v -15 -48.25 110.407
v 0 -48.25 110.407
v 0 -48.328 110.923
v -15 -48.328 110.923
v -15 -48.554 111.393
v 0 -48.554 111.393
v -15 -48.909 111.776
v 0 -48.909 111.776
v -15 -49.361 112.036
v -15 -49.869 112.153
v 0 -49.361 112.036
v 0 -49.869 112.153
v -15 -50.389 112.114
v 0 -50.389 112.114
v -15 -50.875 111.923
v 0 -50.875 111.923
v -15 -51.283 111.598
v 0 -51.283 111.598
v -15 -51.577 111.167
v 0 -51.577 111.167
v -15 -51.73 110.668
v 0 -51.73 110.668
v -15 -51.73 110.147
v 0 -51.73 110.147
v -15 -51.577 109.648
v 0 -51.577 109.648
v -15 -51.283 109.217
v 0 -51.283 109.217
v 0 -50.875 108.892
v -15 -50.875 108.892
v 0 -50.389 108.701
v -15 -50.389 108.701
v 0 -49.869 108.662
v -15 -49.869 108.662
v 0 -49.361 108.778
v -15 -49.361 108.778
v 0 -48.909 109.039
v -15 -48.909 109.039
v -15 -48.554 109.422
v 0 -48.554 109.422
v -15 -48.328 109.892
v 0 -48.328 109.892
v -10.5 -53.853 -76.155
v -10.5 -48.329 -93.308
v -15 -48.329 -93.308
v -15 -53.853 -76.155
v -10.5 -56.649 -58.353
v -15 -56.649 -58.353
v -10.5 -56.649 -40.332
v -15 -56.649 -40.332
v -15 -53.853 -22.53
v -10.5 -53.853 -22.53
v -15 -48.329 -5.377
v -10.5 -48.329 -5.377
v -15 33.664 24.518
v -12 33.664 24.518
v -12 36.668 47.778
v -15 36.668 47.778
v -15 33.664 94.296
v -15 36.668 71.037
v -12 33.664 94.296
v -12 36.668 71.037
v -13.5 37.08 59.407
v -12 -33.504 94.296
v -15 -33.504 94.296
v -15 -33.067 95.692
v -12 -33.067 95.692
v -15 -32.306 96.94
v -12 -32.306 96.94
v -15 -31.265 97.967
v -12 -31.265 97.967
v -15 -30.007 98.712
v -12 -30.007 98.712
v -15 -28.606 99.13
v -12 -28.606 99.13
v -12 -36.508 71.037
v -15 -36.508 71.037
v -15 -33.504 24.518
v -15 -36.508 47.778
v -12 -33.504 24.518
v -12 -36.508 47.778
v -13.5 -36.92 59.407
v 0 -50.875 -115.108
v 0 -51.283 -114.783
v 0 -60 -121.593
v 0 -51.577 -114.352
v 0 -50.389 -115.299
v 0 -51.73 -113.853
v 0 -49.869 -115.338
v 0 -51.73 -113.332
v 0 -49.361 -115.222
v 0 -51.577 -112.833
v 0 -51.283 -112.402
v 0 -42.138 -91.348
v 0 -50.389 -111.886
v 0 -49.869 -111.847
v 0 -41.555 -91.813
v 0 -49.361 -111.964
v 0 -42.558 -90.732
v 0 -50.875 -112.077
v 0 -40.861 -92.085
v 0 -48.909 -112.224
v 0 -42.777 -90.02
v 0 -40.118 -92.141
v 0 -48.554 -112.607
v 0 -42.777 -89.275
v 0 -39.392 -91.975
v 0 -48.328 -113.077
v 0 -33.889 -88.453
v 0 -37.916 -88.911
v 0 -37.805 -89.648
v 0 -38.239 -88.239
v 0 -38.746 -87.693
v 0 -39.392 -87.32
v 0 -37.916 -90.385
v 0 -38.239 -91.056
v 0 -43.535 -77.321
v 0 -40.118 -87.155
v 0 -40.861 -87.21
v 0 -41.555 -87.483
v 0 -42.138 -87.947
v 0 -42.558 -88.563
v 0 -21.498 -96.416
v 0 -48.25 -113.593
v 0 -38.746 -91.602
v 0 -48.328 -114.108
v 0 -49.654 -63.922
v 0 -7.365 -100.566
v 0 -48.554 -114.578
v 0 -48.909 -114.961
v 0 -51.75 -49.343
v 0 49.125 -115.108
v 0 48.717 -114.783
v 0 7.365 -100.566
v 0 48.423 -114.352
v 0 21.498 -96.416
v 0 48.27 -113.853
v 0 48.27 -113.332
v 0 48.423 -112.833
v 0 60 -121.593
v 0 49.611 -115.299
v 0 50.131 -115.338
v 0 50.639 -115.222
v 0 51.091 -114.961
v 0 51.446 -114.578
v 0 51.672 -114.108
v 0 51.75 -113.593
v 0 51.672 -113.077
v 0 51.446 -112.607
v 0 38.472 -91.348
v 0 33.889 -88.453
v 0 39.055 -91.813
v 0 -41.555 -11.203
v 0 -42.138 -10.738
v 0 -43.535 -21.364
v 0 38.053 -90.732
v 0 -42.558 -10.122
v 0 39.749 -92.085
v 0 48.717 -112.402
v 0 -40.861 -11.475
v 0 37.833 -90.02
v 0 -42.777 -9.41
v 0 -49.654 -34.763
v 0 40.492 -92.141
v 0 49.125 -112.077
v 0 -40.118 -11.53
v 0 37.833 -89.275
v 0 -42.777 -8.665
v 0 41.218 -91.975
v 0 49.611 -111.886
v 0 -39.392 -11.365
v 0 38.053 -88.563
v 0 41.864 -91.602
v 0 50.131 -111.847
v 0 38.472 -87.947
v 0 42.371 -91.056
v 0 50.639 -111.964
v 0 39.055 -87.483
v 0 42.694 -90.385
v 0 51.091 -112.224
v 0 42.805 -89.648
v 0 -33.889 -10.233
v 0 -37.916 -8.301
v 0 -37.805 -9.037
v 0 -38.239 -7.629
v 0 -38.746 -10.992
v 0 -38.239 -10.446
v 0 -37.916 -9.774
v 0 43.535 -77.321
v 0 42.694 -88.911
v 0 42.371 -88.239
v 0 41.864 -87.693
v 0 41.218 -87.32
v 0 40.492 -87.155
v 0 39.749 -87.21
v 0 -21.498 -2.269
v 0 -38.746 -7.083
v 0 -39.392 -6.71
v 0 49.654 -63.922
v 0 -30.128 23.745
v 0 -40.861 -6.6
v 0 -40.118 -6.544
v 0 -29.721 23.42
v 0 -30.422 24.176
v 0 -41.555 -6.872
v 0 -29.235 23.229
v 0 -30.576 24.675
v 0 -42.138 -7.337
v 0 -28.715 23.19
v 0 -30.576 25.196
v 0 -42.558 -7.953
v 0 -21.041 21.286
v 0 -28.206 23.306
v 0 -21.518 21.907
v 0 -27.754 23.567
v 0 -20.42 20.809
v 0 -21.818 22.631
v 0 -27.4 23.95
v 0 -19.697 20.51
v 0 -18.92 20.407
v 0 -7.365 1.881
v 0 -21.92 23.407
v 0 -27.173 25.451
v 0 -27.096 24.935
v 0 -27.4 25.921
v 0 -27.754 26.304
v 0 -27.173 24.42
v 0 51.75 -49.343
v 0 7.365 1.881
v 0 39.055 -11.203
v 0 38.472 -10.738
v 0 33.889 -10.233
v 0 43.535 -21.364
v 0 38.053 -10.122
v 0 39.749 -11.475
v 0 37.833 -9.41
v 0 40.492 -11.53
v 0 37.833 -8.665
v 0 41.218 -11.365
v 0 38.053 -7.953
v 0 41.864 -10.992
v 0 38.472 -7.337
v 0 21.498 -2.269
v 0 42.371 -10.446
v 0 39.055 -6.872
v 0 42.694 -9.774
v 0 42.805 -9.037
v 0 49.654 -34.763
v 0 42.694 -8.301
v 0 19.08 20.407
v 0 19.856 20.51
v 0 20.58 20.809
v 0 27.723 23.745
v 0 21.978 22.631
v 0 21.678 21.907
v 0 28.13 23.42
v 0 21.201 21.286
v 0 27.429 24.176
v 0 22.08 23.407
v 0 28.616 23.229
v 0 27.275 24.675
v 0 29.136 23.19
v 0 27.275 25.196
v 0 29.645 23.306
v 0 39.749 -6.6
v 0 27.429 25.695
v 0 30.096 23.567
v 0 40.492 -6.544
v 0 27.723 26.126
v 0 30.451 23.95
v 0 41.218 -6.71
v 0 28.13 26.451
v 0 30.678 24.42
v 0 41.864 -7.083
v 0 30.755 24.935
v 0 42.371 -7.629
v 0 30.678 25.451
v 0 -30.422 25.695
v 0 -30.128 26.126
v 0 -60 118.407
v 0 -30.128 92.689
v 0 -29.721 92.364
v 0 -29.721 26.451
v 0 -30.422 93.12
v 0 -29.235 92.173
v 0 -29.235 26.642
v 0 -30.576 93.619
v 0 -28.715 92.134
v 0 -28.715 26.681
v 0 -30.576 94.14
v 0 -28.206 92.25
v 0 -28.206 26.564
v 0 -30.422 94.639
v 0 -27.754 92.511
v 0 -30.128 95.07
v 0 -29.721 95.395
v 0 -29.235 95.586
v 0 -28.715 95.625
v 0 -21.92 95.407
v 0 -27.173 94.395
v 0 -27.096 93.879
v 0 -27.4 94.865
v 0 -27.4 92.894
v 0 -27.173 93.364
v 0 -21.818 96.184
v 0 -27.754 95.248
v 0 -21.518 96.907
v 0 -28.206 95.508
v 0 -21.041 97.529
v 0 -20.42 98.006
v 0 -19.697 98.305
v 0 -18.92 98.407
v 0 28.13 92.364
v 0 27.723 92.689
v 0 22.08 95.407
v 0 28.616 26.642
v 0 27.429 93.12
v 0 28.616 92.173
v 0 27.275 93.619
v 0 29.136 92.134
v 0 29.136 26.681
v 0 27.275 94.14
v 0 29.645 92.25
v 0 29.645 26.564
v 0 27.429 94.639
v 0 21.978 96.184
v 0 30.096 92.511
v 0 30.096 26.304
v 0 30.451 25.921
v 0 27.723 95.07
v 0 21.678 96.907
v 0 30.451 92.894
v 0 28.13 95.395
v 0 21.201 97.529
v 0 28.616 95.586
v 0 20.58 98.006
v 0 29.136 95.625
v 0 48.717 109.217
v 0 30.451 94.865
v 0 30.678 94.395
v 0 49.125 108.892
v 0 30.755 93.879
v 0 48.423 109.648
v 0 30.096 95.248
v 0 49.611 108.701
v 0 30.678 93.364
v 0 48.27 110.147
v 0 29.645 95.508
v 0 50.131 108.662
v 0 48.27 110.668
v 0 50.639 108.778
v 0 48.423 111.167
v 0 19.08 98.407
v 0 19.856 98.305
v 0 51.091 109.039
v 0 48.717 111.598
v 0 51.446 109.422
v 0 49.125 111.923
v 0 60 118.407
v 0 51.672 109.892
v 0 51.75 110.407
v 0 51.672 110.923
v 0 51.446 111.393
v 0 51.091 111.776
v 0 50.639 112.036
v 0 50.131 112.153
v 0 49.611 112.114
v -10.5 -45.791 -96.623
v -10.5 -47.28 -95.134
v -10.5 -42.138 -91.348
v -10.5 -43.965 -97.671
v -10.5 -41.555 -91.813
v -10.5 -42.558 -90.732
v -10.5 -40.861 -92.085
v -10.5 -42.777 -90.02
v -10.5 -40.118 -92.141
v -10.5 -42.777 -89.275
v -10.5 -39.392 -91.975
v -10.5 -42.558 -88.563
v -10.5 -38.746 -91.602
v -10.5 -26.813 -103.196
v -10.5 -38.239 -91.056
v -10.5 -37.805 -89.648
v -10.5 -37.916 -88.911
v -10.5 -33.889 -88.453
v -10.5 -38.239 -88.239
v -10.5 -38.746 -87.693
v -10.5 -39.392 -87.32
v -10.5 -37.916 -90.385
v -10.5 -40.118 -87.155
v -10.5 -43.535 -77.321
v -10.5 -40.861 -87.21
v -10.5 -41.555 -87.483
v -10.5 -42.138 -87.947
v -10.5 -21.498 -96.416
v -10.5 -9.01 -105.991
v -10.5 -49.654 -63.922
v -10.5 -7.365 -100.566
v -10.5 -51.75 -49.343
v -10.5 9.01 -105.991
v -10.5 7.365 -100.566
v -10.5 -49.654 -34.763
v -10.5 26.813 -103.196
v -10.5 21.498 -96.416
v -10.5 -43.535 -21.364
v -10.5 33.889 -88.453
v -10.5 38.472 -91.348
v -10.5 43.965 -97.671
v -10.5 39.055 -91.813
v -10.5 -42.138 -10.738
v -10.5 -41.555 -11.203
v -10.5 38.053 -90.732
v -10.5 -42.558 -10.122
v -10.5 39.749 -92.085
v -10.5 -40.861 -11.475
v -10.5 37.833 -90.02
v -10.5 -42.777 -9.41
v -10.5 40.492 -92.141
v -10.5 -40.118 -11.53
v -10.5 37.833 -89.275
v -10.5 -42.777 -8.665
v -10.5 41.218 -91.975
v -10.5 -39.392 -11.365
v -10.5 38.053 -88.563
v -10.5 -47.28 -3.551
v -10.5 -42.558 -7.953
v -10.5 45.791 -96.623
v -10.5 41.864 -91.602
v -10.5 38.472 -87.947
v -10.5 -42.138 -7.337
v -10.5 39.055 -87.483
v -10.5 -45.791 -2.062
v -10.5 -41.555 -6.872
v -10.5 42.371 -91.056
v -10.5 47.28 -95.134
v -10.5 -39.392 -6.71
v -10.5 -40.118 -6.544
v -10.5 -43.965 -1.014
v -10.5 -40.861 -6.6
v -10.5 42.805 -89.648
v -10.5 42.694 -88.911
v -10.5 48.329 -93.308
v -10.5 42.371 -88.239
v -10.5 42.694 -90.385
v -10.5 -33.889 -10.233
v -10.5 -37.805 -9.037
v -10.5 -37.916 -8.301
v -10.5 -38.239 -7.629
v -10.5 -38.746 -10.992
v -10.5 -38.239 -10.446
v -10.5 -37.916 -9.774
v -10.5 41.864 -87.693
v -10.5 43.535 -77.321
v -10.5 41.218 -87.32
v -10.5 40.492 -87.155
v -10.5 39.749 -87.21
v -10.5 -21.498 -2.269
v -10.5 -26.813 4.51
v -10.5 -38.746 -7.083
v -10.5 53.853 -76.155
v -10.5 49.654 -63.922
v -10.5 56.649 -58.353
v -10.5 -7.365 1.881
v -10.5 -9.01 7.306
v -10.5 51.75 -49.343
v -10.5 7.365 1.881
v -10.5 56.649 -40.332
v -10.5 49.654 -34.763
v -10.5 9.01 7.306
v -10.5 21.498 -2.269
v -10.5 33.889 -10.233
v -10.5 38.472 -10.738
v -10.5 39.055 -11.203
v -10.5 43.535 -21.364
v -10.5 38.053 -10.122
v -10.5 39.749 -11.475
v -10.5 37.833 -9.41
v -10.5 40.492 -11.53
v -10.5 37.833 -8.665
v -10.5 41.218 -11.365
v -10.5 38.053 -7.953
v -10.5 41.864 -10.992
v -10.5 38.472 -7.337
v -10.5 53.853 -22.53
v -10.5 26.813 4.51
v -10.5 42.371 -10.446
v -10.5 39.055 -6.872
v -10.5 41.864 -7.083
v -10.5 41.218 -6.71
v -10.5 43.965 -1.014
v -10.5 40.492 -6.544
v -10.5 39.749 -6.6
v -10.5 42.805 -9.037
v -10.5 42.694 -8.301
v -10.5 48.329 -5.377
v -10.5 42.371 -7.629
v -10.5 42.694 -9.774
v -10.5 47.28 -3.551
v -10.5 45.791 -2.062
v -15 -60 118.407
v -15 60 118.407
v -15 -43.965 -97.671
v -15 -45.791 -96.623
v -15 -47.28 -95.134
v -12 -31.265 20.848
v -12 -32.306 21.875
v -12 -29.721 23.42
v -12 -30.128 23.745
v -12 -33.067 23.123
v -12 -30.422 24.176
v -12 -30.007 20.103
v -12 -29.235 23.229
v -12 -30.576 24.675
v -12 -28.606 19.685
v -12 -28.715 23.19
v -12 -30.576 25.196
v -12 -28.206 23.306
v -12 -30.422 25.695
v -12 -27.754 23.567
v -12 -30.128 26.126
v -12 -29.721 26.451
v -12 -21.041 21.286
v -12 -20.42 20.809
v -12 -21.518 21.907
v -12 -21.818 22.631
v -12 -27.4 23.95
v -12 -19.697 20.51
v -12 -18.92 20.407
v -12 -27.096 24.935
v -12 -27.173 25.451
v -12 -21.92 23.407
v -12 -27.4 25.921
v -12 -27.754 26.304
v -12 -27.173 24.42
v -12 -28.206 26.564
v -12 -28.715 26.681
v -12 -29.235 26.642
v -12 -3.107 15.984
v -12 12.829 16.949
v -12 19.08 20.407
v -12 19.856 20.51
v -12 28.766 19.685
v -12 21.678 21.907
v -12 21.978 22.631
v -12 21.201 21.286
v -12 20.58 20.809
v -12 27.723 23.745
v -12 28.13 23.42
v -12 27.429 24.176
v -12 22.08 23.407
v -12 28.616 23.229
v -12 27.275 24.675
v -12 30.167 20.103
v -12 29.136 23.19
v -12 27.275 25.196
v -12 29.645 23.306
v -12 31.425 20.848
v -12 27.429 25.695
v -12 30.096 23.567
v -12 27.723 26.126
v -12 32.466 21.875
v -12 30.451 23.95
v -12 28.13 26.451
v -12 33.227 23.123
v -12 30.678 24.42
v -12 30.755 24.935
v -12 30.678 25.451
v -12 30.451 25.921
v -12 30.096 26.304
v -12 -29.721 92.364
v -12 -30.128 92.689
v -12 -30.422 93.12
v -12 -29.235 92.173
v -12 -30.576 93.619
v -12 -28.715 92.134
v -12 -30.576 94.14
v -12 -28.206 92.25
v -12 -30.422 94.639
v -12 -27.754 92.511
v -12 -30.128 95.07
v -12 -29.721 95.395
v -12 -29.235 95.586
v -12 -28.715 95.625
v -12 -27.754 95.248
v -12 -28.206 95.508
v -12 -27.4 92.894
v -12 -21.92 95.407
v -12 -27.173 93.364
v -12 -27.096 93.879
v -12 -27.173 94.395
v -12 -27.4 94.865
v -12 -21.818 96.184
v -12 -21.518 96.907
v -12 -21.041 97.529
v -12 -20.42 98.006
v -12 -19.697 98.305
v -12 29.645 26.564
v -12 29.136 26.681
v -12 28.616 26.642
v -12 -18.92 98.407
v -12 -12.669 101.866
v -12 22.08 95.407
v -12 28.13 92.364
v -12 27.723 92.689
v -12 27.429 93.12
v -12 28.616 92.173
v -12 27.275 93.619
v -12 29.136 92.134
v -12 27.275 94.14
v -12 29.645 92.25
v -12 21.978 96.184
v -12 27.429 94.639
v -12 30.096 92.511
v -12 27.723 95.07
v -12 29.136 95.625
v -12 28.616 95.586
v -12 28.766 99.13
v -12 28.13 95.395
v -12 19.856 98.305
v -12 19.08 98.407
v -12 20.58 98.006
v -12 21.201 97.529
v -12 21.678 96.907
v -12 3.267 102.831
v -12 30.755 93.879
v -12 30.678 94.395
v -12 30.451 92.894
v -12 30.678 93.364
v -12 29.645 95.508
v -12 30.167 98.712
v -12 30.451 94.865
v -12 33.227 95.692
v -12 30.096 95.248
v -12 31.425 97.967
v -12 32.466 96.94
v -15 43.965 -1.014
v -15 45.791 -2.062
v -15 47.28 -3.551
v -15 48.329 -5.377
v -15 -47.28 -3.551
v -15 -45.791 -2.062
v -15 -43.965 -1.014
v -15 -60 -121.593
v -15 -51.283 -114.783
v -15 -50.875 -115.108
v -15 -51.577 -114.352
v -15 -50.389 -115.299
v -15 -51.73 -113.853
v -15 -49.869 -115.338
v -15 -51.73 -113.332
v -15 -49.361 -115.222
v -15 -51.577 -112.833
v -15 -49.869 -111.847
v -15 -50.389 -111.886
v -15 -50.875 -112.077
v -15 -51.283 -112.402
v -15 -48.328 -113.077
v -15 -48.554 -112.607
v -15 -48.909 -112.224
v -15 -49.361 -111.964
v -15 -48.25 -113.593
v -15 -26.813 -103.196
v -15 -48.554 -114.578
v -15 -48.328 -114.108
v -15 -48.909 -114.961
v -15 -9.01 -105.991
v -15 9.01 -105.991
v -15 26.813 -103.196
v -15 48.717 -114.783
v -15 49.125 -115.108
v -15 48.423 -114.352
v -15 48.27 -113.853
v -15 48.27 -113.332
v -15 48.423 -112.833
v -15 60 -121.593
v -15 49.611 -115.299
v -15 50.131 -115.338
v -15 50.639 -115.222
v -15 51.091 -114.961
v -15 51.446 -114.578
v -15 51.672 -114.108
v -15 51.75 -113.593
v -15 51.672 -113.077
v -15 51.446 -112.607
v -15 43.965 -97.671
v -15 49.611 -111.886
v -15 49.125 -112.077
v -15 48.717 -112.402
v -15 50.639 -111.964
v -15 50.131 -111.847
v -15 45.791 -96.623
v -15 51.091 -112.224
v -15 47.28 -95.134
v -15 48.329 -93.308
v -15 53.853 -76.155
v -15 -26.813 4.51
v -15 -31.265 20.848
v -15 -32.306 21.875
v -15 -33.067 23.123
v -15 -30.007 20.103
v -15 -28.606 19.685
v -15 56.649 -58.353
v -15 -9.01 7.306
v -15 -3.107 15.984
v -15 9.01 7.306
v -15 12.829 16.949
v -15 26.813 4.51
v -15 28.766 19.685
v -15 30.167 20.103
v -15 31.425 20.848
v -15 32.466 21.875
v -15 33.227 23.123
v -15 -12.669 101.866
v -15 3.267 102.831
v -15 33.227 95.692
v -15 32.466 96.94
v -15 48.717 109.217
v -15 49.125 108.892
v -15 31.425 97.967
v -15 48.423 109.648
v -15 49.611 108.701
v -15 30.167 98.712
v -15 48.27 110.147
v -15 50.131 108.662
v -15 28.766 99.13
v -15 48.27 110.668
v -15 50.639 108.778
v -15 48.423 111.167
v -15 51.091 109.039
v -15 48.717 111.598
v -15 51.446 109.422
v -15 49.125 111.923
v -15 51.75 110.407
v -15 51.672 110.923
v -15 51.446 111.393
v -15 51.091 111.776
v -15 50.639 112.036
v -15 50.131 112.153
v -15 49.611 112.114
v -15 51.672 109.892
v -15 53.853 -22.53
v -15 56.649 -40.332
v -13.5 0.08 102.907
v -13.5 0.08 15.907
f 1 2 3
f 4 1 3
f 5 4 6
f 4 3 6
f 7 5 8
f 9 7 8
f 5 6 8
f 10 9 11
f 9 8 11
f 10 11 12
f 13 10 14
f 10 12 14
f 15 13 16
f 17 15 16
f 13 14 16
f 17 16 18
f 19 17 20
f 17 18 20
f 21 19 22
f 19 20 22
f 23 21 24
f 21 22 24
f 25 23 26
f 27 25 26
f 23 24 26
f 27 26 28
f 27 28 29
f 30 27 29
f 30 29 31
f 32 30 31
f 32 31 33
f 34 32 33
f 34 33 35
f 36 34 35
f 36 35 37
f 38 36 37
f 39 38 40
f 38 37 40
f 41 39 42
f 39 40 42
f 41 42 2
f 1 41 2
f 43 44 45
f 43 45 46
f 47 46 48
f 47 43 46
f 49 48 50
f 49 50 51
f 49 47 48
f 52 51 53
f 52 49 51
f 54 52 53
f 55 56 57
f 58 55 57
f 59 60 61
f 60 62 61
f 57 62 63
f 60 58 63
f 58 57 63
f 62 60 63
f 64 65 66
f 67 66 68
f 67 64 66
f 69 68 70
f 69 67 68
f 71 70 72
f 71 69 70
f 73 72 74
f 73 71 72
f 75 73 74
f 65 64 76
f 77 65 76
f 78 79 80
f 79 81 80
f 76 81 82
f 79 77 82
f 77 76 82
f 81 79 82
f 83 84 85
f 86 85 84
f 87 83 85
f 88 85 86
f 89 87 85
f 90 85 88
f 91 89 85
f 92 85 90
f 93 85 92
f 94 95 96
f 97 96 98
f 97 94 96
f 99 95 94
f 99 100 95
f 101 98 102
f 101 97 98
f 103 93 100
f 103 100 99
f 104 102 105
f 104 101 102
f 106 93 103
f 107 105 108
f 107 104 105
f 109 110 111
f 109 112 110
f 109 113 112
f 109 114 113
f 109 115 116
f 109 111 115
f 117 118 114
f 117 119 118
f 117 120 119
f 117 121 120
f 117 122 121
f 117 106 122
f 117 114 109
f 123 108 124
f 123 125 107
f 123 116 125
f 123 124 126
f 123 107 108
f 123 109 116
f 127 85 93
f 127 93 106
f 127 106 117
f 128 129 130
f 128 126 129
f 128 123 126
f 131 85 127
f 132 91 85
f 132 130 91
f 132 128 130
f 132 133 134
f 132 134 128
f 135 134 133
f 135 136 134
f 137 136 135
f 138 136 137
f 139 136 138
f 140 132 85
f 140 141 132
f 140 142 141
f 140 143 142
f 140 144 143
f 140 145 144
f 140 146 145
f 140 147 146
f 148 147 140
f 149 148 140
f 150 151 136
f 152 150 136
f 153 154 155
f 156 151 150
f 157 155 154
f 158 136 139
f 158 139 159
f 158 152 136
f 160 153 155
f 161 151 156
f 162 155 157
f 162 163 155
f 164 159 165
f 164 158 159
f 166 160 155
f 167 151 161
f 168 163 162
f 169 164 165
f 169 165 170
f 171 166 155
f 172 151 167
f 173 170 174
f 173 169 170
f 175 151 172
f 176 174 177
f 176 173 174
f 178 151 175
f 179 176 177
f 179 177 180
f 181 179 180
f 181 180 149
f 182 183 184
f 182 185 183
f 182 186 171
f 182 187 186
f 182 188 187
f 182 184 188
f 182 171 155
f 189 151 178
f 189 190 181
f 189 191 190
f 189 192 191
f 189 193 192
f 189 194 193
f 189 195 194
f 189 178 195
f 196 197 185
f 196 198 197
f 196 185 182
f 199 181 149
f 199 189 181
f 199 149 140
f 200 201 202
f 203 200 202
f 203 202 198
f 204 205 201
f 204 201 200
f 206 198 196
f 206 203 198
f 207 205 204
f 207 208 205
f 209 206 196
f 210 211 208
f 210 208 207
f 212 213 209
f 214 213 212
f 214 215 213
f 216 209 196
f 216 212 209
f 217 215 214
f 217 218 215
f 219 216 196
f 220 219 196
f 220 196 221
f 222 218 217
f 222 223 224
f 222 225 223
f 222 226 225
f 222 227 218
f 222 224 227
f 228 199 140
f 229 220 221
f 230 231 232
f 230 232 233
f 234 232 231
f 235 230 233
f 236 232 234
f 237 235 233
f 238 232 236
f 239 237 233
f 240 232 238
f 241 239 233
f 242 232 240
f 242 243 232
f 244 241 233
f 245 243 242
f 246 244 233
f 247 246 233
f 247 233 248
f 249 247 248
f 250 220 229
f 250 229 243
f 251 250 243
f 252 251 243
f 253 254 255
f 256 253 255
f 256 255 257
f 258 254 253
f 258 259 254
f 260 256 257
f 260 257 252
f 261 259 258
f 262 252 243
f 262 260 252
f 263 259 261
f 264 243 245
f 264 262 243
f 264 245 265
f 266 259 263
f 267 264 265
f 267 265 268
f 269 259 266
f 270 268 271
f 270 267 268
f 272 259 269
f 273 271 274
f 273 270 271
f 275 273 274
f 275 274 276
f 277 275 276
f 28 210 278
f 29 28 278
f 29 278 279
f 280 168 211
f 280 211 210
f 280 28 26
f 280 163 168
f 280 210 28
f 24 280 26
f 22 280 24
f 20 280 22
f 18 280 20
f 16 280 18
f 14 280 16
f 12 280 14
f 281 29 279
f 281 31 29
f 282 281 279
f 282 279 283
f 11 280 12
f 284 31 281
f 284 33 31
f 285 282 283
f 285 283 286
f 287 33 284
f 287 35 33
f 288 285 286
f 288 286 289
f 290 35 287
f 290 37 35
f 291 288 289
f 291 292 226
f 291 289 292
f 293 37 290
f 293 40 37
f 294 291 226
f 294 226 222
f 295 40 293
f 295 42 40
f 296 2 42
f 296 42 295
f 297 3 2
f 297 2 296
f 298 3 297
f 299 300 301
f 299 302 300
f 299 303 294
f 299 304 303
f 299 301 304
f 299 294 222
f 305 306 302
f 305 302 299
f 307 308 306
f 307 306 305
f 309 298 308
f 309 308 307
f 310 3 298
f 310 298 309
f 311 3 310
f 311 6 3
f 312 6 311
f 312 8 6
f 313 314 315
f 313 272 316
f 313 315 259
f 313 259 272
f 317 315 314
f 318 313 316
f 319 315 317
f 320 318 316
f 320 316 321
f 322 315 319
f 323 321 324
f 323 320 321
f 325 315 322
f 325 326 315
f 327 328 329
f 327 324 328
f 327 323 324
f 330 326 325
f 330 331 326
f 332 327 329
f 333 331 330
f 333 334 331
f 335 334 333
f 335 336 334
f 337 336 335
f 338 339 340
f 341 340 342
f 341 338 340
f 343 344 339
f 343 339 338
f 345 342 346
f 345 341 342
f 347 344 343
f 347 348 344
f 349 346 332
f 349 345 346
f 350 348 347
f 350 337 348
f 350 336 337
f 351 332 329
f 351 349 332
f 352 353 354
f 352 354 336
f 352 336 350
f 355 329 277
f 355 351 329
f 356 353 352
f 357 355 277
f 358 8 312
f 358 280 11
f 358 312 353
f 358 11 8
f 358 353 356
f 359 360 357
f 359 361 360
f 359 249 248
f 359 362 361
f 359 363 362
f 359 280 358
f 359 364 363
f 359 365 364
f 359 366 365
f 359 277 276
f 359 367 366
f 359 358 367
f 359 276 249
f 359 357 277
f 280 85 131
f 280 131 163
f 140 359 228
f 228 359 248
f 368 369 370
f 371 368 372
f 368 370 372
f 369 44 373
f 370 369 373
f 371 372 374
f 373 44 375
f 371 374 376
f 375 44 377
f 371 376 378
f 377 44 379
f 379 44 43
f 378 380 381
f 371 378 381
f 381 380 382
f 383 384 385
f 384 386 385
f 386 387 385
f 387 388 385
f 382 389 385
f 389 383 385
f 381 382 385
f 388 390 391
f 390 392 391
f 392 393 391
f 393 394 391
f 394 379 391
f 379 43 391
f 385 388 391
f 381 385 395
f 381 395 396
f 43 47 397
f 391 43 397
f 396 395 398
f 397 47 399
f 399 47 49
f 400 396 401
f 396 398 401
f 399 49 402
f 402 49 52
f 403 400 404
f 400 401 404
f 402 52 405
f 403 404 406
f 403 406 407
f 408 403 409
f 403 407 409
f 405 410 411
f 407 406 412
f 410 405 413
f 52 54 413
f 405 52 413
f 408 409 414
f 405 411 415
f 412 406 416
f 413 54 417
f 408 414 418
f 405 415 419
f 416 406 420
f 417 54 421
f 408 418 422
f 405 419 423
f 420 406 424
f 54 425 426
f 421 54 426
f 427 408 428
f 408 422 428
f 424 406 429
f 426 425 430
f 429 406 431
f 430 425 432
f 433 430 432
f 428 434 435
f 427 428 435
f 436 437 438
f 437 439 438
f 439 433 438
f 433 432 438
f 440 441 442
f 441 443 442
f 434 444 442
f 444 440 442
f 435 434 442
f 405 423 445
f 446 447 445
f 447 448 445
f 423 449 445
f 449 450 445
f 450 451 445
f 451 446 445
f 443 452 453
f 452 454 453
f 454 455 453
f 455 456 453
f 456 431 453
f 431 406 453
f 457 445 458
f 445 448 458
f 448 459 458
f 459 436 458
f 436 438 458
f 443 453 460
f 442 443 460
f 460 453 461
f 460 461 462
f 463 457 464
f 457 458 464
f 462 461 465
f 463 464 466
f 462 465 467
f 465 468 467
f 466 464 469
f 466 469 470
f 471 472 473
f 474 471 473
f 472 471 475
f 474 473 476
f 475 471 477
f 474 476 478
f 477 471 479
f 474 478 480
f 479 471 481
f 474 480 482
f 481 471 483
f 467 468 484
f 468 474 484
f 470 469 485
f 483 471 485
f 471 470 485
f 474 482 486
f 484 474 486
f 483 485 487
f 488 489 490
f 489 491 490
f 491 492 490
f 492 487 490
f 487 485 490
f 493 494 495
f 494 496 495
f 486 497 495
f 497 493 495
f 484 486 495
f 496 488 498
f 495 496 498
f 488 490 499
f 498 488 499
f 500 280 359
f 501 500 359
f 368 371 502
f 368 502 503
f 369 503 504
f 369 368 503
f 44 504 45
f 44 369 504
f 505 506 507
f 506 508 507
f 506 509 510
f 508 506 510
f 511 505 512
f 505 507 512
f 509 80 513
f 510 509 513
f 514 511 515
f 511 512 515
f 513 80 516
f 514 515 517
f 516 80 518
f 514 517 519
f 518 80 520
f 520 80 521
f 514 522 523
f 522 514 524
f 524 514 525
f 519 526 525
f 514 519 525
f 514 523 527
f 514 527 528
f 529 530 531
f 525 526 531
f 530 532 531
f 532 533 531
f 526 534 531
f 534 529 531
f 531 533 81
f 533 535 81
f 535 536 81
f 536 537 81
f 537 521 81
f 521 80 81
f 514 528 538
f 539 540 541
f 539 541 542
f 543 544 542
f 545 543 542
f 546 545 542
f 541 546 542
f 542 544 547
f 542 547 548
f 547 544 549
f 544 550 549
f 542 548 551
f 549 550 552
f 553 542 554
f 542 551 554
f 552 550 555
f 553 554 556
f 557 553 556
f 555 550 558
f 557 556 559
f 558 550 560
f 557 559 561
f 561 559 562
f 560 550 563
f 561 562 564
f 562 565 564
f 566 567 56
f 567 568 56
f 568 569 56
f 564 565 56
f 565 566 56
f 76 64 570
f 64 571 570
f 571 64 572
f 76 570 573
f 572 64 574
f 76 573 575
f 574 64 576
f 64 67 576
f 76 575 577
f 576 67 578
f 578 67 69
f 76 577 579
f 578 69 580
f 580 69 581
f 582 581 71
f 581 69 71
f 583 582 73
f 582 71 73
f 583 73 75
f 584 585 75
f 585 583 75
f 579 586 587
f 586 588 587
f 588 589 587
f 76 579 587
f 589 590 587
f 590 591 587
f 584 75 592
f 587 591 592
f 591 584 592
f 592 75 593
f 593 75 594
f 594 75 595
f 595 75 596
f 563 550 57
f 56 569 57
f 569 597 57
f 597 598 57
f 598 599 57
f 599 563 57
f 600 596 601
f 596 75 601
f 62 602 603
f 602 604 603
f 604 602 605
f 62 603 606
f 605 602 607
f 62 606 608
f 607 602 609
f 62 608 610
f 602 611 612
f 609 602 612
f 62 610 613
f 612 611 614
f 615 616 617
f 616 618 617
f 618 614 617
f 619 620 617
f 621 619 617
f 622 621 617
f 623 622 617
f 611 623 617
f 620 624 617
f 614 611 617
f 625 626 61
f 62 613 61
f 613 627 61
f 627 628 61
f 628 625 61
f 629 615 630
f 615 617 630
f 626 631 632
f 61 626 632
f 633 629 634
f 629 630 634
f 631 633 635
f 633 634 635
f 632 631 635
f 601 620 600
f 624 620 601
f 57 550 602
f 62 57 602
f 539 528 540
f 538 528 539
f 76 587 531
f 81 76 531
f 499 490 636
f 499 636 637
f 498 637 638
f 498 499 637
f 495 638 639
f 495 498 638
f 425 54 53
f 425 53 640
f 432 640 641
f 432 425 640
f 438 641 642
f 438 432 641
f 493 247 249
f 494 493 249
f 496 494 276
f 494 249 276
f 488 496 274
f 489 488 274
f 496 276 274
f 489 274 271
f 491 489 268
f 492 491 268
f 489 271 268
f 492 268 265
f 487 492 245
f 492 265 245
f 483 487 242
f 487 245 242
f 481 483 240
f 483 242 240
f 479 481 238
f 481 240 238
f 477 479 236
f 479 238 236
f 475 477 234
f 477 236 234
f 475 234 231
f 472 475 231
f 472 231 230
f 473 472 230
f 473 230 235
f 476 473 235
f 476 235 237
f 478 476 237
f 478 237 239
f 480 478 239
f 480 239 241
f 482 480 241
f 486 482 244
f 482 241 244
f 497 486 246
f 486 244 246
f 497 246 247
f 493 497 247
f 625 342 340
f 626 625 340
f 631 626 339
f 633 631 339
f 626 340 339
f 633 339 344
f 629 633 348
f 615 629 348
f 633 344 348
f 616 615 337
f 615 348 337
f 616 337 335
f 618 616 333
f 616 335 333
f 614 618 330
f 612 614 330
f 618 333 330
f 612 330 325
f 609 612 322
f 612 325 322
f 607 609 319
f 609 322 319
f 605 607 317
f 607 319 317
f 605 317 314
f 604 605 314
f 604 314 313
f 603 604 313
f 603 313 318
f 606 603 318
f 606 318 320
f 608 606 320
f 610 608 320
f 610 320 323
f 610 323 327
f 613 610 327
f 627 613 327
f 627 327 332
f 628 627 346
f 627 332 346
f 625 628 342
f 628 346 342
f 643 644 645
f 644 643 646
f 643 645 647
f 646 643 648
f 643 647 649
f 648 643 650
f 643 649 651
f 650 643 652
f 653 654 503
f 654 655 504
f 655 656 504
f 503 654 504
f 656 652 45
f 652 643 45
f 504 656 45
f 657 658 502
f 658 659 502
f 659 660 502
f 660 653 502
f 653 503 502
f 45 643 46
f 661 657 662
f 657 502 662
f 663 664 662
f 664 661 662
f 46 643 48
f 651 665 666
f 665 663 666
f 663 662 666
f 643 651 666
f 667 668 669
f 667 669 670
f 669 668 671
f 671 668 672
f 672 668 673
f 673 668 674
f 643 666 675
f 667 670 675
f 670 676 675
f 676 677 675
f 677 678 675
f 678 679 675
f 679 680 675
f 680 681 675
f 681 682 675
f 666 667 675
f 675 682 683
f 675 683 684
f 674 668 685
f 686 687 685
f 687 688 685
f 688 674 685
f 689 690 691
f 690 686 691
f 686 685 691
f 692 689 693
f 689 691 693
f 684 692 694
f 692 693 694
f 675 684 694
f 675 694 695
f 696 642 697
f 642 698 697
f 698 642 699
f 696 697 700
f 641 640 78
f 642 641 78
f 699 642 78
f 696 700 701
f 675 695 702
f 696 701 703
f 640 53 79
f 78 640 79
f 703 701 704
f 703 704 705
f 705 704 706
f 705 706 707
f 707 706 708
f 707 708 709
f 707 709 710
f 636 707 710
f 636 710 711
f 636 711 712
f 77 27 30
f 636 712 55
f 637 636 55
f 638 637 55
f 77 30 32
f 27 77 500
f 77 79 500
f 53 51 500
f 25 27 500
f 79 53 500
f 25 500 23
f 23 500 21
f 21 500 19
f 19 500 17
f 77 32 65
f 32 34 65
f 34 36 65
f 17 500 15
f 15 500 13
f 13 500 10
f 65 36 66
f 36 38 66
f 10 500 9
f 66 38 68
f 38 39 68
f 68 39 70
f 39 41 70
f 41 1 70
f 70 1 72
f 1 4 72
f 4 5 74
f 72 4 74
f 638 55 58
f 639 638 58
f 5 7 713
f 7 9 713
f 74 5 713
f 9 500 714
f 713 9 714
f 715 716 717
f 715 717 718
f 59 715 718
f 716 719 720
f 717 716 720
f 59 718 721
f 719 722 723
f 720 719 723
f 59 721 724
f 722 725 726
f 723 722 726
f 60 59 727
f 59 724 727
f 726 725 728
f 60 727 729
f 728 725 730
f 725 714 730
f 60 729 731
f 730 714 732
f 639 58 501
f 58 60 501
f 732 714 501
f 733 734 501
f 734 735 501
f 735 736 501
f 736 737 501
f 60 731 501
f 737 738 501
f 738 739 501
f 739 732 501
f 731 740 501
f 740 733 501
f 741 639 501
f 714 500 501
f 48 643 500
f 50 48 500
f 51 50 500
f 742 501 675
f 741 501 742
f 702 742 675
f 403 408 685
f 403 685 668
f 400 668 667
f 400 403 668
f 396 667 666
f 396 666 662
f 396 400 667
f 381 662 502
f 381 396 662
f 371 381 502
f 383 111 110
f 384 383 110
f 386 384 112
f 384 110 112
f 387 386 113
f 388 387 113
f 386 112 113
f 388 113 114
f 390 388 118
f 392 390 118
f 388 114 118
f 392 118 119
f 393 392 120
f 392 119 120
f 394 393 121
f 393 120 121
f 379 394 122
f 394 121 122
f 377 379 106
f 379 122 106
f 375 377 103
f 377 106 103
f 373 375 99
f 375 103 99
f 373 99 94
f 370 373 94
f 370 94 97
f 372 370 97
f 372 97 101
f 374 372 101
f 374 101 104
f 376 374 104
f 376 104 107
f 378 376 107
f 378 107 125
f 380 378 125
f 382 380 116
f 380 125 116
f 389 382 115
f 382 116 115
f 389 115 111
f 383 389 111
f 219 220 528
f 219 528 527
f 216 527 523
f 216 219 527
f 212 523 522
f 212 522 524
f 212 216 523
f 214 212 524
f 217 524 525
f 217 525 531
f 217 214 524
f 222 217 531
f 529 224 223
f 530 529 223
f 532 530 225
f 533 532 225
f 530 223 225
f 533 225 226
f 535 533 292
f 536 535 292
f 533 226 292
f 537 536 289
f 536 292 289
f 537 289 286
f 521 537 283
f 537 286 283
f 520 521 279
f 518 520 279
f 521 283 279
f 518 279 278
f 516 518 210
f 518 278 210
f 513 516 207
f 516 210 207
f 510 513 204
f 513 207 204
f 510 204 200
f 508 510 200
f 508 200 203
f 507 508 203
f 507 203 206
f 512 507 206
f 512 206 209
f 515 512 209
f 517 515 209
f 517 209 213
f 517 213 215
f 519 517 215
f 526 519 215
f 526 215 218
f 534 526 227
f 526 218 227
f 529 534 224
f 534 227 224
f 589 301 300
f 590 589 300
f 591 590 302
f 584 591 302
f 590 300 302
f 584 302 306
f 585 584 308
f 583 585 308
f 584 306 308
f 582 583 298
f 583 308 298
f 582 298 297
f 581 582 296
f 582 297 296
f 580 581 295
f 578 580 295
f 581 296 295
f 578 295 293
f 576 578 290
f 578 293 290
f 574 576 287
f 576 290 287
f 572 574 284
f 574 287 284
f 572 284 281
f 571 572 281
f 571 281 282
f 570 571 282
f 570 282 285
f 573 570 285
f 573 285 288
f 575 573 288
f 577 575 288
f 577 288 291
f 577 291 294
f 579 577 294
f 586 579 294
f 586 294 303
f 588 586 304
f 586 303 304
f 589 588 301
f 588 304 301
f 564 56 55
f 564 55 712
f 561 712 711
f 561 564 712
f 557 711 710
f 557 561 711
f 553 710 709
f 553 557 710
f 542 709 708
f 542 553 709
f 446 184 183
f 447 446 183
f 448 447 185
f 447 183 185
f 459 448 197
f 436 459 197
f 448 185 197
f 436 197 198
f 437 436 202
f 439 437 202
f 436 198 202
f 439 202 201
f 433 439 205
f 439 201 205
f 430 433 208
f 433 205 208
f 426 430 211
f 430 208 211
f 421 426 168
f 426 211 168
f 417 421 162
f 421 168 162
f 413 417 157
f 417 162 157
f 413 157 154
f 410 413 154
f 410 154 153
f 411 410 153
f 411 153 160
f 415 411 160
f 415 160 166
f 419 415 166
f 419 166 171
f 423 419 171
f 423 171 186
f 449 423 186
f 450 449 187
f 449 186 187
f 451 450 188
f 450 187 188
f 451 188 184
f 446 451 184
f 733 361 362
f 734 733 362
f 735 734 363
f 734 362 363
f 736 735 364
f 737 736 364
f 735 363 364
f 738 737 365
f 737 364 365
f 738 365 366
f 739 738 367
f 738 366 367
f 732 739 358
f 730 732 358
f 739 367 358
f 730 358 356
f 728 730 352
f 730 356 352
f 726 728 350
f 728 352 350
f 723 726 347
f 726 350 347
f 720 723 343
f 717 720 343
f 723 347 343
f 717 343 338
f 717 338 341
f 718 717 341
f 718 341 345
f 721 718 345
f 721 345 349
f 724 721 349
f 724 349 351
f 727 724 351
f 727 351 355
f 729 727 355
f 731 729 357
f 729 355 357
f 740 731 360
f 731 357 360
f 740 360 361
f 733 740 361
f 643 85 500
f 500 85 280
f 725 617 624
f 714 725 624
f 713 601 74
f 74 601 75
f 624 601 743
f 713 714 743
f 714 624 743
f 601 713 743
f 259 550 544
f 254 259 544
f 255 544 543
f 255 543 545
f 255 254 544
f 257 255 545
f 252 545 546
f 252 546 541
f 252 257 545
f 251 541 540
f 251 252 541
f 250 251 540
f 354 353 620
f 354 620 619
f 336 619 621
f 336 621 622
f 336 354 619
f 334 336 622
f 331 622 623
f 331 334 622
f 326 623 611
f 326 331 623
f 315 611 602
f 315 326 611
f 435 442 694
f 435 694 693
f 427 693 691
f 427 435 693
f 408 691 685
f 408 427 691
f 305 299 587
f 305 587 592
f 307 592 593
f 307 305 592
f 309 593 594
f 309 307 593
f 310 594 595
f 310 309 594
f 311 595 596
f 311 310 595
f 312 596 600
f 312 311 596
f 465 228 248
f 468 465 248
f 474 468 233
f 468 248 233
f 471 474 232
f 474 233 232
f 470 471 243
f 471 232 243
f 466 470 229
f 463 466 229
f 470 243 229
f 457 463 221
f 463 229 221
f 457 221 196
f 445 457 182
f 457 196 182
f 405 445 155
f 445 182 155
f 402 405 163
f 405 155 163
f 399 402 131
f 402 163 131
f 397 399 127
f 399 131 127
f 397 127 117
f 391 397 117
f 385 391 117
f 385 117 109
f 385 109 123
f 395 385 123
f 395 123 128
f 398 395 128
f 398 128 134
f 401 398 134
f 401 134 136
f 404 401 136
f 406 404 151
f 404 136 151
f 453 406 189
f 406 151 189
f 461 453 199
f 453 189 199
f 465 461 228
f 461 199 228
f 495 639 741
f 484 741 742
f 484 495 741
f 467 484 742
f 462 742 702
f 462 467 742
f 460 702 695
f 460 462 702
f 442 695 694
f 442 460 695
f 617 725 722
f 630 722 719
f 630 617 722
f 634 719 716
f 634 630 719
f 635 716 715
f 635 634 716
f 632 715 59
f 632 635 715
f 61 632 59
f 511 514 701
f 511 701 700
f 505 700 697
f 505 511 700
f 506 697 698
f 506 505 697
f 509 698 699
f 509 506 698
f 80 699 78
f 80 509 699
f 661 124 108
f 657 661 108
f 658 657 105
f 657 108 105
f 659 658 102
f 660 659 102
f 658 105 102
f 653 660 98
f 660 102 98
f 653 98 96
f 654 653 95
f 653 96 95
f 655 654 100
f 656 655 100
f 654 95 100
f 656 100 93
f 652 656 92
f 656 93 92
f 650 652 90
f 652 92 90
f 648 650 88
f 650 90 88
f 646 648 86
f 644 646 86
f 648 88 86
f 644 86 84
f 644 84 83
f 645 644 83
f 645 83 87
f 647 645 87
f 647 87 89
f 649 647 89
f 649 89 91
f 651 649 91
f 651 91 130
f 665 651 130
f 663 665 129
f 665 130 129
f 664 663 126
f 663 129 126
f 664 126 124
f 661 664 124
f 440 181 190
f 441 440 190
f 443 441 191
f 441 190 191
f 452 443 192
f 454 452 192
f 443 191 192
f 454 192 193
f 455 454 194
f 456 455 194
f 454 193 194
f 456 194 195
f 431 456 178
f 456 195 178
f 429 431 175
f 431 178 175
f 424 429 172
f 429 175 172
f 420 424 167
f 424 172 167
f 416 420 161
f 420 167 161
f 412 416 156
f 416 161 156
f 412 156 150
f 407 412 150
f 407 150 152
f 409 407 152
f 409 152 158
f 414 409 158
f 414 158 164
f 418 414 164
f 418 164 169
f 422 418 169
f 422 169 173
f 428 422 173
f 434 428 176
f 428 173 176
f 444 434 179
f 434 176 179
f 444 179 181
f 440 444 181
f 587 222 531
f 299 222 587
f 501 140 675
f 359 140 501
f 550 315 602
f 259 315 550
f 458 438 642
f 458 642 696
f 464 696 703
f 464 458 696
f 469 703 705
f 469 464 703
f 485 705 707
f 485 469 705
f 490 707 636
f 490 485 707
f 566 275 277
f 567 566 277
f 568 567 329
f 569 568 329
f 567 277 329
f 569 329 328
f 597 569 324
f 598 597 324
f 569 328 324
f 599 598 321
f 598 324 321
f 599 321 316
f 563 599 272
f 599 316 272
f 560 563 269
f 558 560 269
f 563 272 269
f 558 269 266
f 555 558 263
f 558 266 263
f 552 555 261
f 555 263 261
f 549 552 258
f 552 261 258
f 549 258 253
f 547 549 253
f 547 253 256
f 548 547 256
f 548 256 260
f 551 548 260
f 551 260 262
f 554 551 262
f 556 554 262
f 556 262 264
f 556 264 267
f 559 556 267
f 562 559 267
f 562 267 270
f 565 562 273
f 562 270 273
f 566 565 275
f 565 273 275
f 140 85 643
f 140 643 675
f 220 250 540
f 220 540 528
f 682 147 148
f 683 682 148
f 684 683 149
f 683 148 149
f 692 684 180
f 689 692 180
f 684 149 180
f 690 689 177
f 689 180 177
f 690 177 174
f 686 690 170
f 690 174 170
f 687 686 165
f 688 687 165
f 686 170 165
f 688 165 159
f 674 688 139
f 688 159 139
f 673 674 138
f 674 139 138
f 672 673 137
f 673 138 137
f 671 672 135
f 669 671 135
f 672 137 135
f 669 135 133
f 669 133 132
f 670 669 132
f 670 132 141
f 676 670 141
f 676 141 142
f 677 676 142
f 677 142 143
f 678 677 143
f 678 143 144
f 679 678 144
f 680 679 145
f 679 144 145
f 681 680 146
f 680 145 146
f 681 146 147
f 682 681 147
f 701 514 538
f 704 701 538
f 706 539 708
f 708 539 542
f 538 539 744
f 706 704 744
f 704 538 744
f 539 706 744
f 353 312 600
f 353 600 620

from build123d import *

# Parameters (mm, degrees)
F0_W     = 120
F0_H     = 240
F0_R     = 1.75
F1_DEPTH = 15
F2_DEPTH = 12
F0_R_2   = 2.5
F0_R_3   = 51.75
F3_DEPTH = 10.5


with BuildPart() as f1:
    # F0 (on Right) → F1 (new body)
    with BuildSketch(Plane.YZ):
        with Locations((0, -1.5925480289)):
            Rectangle(F0_W, F0_H)
        with Locations((-49.9999973178, -113.5925480289)):
            Circle(F0_R, mode=Mode.SUBTRACT)
        with BuildLine():
            ThreePointArc((-43.965421423, -1.0136459871), (0, 7.6574519711), (43.965421423, -1.0136459871))
            ThreePointArc((43.965421423, -1.0136459871), (46.5848197582, -2.7577282708), (48.3289020419, -5.377126606))
            ThreePointArc((48.3289020419, -5.377126606), (57, -49.3425480289), (48.3289020419, -93.3079694519))
            ThreePointArc((48.3289020419, -93.3079694519), (46.5848197582, -95.9273677871), (43.965421423, -97.6714500708))
            ThreePointArc((43.965421423, -97.6714500708), (0, -106.3425480289), (-43.965421423, -97.6714500708))
            ThreePointArc((-43.965421423, -97.6714500708), (-46.5848197582, -95.9273677871), (-48.3289020419, -93.3079694519))
            ThreePointArc((-48.3289020419, -93.3079694519), (-57, -49.3425480289), (-48.3289020419, -5.377126606))
            ThreePointArc((-48.3289020419, -5.377126606), (-46.5848197582, -2.7577282708), (-43.965421423, -1.0136459871))
        make_face(mode=Mode.SUBTRACT)
        with Locations((50.0000026822, -113.5925480289)):
            Circle(F0_R, mode=Mode.SUBTRACT)
        with Locations((-49.9999973178, 110.4074519711)):
            Circle(F0_R, mode=Mode.SUBTRACT)
        with BuildLine():
            add(Edge.make_bspline(
                [(32.8620764687, 98.4757185701), (31.4966530962, 98.6776279271), (30.1312297237, 98.8982735514), (28.7658063512, 99.1298205687)],
                knots=[0, 0, 0, 0, 0.0624771081, 0.0624771081, 0.0624771081, 0.0624771081], degree=3))
            add(Edge.make_bspline(
                [(33.6642538877, 94.2964592226), (33.4088016163, 95.6895456718), (33.1411606803, 97.082632121), (32.8620764687, 98.4757185701)],
                knots=[0.9465133763, 0.9465133763, 0.9465133763, 0.9465133763, 1, 1, 1, 1], degree=3))
            add(Edge.make_bspline(
                [(33.6642538877, 24.5184447195), (35.7968030814, 36.1481138033), (38.3630136679, 59.4074519711), (35.7968030814, 82.6667901388), (33.6642538877, 94.2964592226)],
                knots=[0.0534866237, 0.0534866237, 0.0534866237, 0.0534866237, 0.5, 0.9465133763, 0.9465133763, 0.9465133763, 0.9465133763], degree=3))
            add(Edge.make_bspline(
                [(32.8620764687, 20.339185372), (33.1411606803, 21.7322718212), (33.4088016163, 23.1253582703), (33.6642538877, 24.5184447195)],
                knots=[0, 0, 0, 0, 0.0534866237, 0.0534866237, 0.0534866237, 0.0534866237], degree=3))
            add(Edge.make_bspline(
                [(28.7658063512, 19.6850833734), (30.1312297237, 19.9166303908), (31.4966530962, 20.1372760151), (32.8620764687, 20.339185372)],
                knots=[0.9375228919, 0.9375228919, 0.9375228919, 0.9375228919, 1, 1, 1, 1], degree=3))
            add(Edge.make_bspline(
                [(-28.6059896019, 19.6850833734), (-19.0440236097, 18.0635755317), (0.0799083746, 13.7513284104), (19.203840359, 18.0635755317), (28.7658063512, 19.6850833734)],
                knots=[0.0624771081, 0.0624771081, 0.0624771081, 0.0624771081, 0.5, 0.9375228919, 0.9375228919, 0.9375228919, 0.9375228919], degree=3))
            add(Edge.make_bspline(
                [(-32.7022597194, 20.339185372), (-31.3368363469, 20.1372760151), (-29.9714129744, 19.9166303908), (-28.6059896019, 19.6850833734)],
                knots=[0, 0, 0, 0, 0.0624771081, 0.0624771081, 0.0624771081, 0.0624771081], degree=3))
            add(Edge.make_bspline(
                [(-33.5044371384, 24.5184447195), (-33.248984867, 23.1253582703), (-32.981343931, 21.7322718212), (-32.7022597194, 20.339185372)],
                knots=[0.9465133763, 0.9465133763, 0.9465133763, 0.9465133763, 1, 1, 1, 1], degree=3))
            add(Edge.make_bspline(
                [(-33.5044371384, 94.2964592226), (-35.6369863321, 82.6667901388), (-38.2031969186, 59.4074519711), (-35.6369863321, 36.1481138033), (-33.5044371384, 24.5184447195)],
                knots=[0.0534866237, 0.0534866237, 0.0534866237, 0.0534866237, 0.5, 0.9465133763, 0.9465133763, 0.9465133763, 0.9465133763], degree=3))
            add(Edge.make_bspline(
                [(-32.7022597194, 98.4757185701), (-32.981343931, 97.082632121), (-33.248984867, 95.6895456718), (-33.5044371384, 94.2964592226)],
                knots=[0, 0, 0, 0, 0.0534866237, 0.0534866237, 0.0534866237, 0.0534866237], degree=3))
            add(Edge.make_bspline(
                [(-28.6059896019, 99.1298205687), (-29.9714129744, 98.8982735514), (-31.3368363469, 98.6776279271), (-32.7022597194, 98.4757185701)],
                knots=[0.9375228919, 0.9375228919, 0.9375228919, 0.9375228919, 1, 1, 1, 1], degree=3))
            add(Edge.make_bspline(
                [(28.7658063512, 99.1298205687), (19.203840359, 100.7513284104), (0.0799083746, 105.0635755317), (-19.0440236097, 100.7513284104), (-28.6059896019, 99.1298205687)],
                knots=[0.0624771081, 0.0624771081, 0.0624771081, 0.0624771081, 0.5, 0.9375228919, 0.9375228919, 0.9375228919, 0.9375228919], degree=3))
        make_face(mode=Mode.SUBTRACT)
        with Locations((50.0000026822, 110.4074554281)):
            Circle(F0_R, mode=Mode.SUBTRACT)
        with BuildLine():
            add(Edge.make_bspline(
                [(33.6642538877, 94.2964592226), (33.4088016163, 95.6895456718), (33.1411606803, 97.082632121), (32.8620764687, 98.4757185701)],
                knots=[0.9465133763, 0.9465133763, 0.9465133763, 0.9465133763, 1, 1, 1, 1], degree=3))
            add(Edge.make_bspline(
                [(32.8620764687, 98.4757185701), (31.4966530962, 98.6776279271), (30.1312297237, 98.8982735514), (28.7658063512, 99.1298205687)],
                knots=[0, 0, 0, 0, 0.0624771081, 0.0624771081, 0.0624771081, 0.0624771081], degree=3))
            ThreePointArc((28.7658063512, 99.1298205687), (31.9768261624, 97.4851943073), (33.6642538877, 94.2964592226))
        make_face()
        with BuildLine():
            ThreePointArc((-33.5044371384, 94.2964592226), (-31.8170094131, 97.4851943073), (-28.6059896019, 99.1298205687))
            add(Edge.make_bspline(
                [(-28.6059896019, 99.1298205687), (-29.9714129744, 98.8982735514), (-31.3368363469, 98.6776279271), (-32.7022597194, 98.4757185701)],
                knots=[0.9375228919, 0.9375228919, 0.9375228919, 0.9375228919, 1, 1, 1, 1], degree=3))
            add(Edge.make_bspline(
                [(-32.7022597194, 98.4757185701), (-32.981343931, 97.082632121), (-33.248984867, 95.6895456718), (-33.5044371384, 94.2964592226)],
                knots=[0, 0, 0, 0, 0.0534866237, 0.0534866237, 0.0534866237, 0.0534866237], degree=3))
        make_face()
        with BuildLine():
            add(Edge.make_bspline(
                [(32.8620764687, 20.339185372), (33.1411606803, 21.7322718212), (33.4088016163, 23.1253582703), (33.6642538877, 24.5184447195)],
                knots=[0, 0, 0, 0, 0.0534866237, 0.0534866237, 0.0534866237, 0.0534866237], degree=3))
            ThreePointArc((33.6642538877, 24.5184447195), (31.9768261624, 21.3297096348), (28.7658063512, 19.6850833734))
            add(Edge.make_bspline(
                [(28.7658063512, 19.6850833734), (30.1312297237, 19.9166303908), (31.4966530962, 20.1372760151), (32.8620764687, 20.339185372)],
                knots=[0.9375228919, 0.9375228919, 0.9375228919, 0.9375228919, 1, 1, 1, 1], degree=3))
        make_face()
        with BuildLine():
            ThreePointArc((-28.6059896019, 19.6850833734), (-31.8170094131, 21.3297096348), (-33.5044371384, 24.5184447195))
            add(Edge.make_bspline(
                [(-33.5044371384, 24.5184447195), (-33.248984867, 23.1253582703), (-32.981343931, 21.7322718212), (-32.7022597194, 20.339185372)],
                knots=[0.9465133763, 0.9465133763, 0.9465133763, 0.9465133763, 1, 1, 1, 1], degree=3))
            add(Edge.make_bspline(
                [(-32.7022597194, 20.339185372), (-31.3368363469, 20.1372760151), (-29.9714129744, 19.9166303908), (-28.6059896019, 19.6850833734)],
                knots=[0, 0, 0, 0, 0.0624771081, 0.0624771081, 0.0624771081, 0.0624771081], degree=3))
        make_face()
    extrude(amount=-F1_DEPTH)

    # F0 (on Right) → F2 (join)
    with BuildSketch(Plane.YZ):
        with BuildLine():
            add(Edge.make_bspline(
                [(33.6642538877, 94.2964592226), (33.4088016163, 95.6895456718), (33.1411606803, 97.082632121), (32.8620764687, 98.4757185701)],
                knots=[0.9465133763, 0.9465133763, 0.9465133763, 0.9465133763, 1, 1, 1, 1], degree=3))
            add(Edge.make_bspline(
                [(32.8620764687, 98.4757185701), (31.4966530962, 98.6776279271), (30.1312297237, 98.8982735514), (28.7658063512, 99.1298205687)],
                knots=[0, 0, 0, 0, 0.0624771081, 0.0624771081, 0.0624771081, 0.0624771081], degree=3))
            ThreePointArc((28.7658063512, 99.1298205687), (31.9768261624, 97.4851943073), (33.6642538877, 94.2964592226))
        make_face()
        with BuildLine():
            ThreePointArc((33.6642538877, 94.2964592226), (31.9768261624, 97.4851943073), (28.7658063512, 99.1298205687))
            add(Edge.make_bspline(
                [(28.7658063512, 99.1298205687), (19.203840359, 100.7513284104), (0.0799083746, 105.0635755317), (-19.0440236097, 100.7513284104), (-28.6059896019, 99.1298205687)],
                knots=[0.0624771081, 0.0624771081, 0.0624771081, 0.0624771081, 0.5, 0.9375228919, 0.9375228919, 0.9375228919, 0.9375228919], degree=3))
            ThreePointArc((-28.6059896019, 99.1298205687), (-31.8170094131, 97.4851943073), (-33.5044371384, 94.2964592226))
            add(Edge.make_bspline(
                [(-33.5044371384, 94.2964592226), (-35.6369863321, 82.6667901388), (-38.2031969186, 59.4074519711), (-35.6369863321, 36.1481138033), (-33.5044371384, 24.5184447195)],
                knots=[0.0534866237, 0.0534866237, 0.0534866237, 0.0534866237, 0.5, 0.9465133763, 0.9465133763, 0.9465133763, 0.9465133763], degree=3))
            ThreePointArc((-33.5044371384, 24.5184447195), (-31.8170094131, 21.3297096348), (-28.6059896019, 19.6850833734))
            add(Edge.make_bspline(
                [(-28.6059896019, 19.6850833734), (-19.0440236097, 18.0635755317), (0.0799083746, 13.7513284104), (19.203840359, 18.0635755317), (28.7658063512, 19.6850833734)],
                knots=[0.0624771081, 0.0624771081, 0.0624771081, 0.0624771081, 0.5, 0.9375228919, 0.9375228919, 0.9375228919, 0.9375228919], degree=3))
            ThreePointArc((28.7658063512, 19.6850833734), (31.9768261624, 21.3297096348), (33.6642538877, 24.5184447195))
            add(Edge.make_bspline(
                [(33.6642538877, 24.5184447195), (35.7968030814, 36.1481138033), (38.3630136679, 59.4074519711), (35.7968030814, 82.6667901388), (33.6642538877, 94.2964592226)],
                knots=[0.0534866237, 0.0534866237, 0.0534866237, 0.0534866237, 0.5, 0.9465133763, 0.9465133763, 0.9465133763, 0.9465133763], degree=3))
        make_face()
        with Locations((-28.8455340613, 24.9354520307)):
            Circle(F0_R, mode=Mode.SUBTRACT)
        with Locations((-28.8455340613, 93.8794519114)):
            Circle(F0_R, mode=Mode.SUBTRACT)
        with Locations((29.0053508105, 24.9354520307)):
            Circle(F0_R, mode=Mode.SUBTRACT)
        with BuildLine():
            Line((-18.9200916254, 98.4074519711), (19.0799083746, 98.4074519711))
            ThreePointArc((19.0799083746, 98.4074519711), (21.2012287182, 97.5287723146), (22.0799083746, 95.4074519711))
            Line((22.0799083746, 95.4074519711), (22.0799083746, 23.4074519711))
            ThreePointArc((22.0799083746, 23.4074519711), (21.2012287182, 21.2861316275), (19.0799083746, 20.4074519711))
            Line((19.0799083746, 20.4074519711), (-18.9200916254, 20.4074519711))
            ThreePointArc((-18.9200916254, 20.4074519711), (-21.0414119689, 21.2861316275), (-21.9200916254, 23.4074519711))
            Line((-21.9200916254, 23.4074519711), (-21.9200916254, 95.4074519711))
            ThreePointArc((-21.9200916254, 95.4074519711), (-21.0414119689, 97.5287723146), (-18.9200916254, 98.4074519711))
        make_face(mode=Mode.SUBTRACT)
        with Locations((29.0053508105, 93.8794519114)):
            Circle(F0_R, mode=Mode.SUBTRACT)
        with BuildLine():
            ThreePointArc((-33.5044371384, 94.2964592226), (-31.8170094131, 97.4851943073), (-28.6059896019, 99.1298205687))
            add(Edge.make_bspline(
                [(-28.6059896019, 99.1298205687), (-29.9714129744, 98.8982735514), (-31.3368363469, 98.6776279271), (-32.7022597194, 98.4757185701)],
                knots=[0.9375228919, 0.9375228919, 0.9375228919, 0.9375228919, 1, 1, 1, 1], degree=3))
            add(Edge.make_bspline(
                [(-32.7022597194, 98.4757185701), (-32.981343931, 97.082632121), (-33.248984867, 95.6895456718), (-33.5044371384, 94.2964592226)],
                knots=[0, 0, 0, 0, 0.0534866237, 0.0534866237, 0.0534866237, 0.0534866237], degree=3))
        make_face()
    extrude(amount=-F2_DEPTH)

    # F0 (on Right) → F3 (join)
    with BuildSketch(Plane.YZ):
        with BuildLine():
            ThreePointArc((48.3289020419, -5.377126606), (46.5848197582, -2.7577282708), (43.965421423, -1.0136459871))
            ThreePointArc((43.965421423, -1.0136459871), (0, 7.6574519711), (-43.965421423, -1.0136459871))
            ThreePointArc((-43.965421423, -1.0136459871), (-46.5848197582, -2.7577282708), (-48.3289020419, -5.377126606))
            ThreePointArc((-48.3289020419, -5.377126606), (-57, -49.3425480289), (-48.3289020419, -93.3079694519))
            ThreePointArc((-48.3289020419, -93.3079694519), (-46.5848197582, -95.9273677871), (-43.965421423, -97.6714500708))
            ThreePointArc((-43.965421423, -97.6714500708), (0, -106.3425480289), (43.965421423, -97.6714500708))
            ThreePointArc((43.965421423, -97.6714500708), (46.5848197582, -95.9273677871), (48.3289020419, -93.3079694519))
            ThreePointArc((48.3289020419, -93.3079694519), (57, -49.3425480289), (48.3289020419, -5.377126606))
        make_face()
        with Locations((-40.3050865276, -89.6476345566)):
            Circle(F0_R_2, mode=Mode.SUBTRACT)
        with Locations((-40.3050865276, -9.0374615013)):
            Circle(F0_R_2, mode=Mode.SUBTRACT)
        with Locations((40.3050865276, -89.6476345566)):
            Circle(F0_R_2, mode=Mode.SUBTRACT)
        with Locations((0, -49.3425480289)):
            Circle(F0_R_3, mode=Mode.SUBTRACT)
        with Locations((40.3050865276, -9.0374615013)):
            Circle(F0_R_2, mode=Mode.SUBTRACT)
    extrude(amount=-F3_DEPTH)


solid = f1.part
